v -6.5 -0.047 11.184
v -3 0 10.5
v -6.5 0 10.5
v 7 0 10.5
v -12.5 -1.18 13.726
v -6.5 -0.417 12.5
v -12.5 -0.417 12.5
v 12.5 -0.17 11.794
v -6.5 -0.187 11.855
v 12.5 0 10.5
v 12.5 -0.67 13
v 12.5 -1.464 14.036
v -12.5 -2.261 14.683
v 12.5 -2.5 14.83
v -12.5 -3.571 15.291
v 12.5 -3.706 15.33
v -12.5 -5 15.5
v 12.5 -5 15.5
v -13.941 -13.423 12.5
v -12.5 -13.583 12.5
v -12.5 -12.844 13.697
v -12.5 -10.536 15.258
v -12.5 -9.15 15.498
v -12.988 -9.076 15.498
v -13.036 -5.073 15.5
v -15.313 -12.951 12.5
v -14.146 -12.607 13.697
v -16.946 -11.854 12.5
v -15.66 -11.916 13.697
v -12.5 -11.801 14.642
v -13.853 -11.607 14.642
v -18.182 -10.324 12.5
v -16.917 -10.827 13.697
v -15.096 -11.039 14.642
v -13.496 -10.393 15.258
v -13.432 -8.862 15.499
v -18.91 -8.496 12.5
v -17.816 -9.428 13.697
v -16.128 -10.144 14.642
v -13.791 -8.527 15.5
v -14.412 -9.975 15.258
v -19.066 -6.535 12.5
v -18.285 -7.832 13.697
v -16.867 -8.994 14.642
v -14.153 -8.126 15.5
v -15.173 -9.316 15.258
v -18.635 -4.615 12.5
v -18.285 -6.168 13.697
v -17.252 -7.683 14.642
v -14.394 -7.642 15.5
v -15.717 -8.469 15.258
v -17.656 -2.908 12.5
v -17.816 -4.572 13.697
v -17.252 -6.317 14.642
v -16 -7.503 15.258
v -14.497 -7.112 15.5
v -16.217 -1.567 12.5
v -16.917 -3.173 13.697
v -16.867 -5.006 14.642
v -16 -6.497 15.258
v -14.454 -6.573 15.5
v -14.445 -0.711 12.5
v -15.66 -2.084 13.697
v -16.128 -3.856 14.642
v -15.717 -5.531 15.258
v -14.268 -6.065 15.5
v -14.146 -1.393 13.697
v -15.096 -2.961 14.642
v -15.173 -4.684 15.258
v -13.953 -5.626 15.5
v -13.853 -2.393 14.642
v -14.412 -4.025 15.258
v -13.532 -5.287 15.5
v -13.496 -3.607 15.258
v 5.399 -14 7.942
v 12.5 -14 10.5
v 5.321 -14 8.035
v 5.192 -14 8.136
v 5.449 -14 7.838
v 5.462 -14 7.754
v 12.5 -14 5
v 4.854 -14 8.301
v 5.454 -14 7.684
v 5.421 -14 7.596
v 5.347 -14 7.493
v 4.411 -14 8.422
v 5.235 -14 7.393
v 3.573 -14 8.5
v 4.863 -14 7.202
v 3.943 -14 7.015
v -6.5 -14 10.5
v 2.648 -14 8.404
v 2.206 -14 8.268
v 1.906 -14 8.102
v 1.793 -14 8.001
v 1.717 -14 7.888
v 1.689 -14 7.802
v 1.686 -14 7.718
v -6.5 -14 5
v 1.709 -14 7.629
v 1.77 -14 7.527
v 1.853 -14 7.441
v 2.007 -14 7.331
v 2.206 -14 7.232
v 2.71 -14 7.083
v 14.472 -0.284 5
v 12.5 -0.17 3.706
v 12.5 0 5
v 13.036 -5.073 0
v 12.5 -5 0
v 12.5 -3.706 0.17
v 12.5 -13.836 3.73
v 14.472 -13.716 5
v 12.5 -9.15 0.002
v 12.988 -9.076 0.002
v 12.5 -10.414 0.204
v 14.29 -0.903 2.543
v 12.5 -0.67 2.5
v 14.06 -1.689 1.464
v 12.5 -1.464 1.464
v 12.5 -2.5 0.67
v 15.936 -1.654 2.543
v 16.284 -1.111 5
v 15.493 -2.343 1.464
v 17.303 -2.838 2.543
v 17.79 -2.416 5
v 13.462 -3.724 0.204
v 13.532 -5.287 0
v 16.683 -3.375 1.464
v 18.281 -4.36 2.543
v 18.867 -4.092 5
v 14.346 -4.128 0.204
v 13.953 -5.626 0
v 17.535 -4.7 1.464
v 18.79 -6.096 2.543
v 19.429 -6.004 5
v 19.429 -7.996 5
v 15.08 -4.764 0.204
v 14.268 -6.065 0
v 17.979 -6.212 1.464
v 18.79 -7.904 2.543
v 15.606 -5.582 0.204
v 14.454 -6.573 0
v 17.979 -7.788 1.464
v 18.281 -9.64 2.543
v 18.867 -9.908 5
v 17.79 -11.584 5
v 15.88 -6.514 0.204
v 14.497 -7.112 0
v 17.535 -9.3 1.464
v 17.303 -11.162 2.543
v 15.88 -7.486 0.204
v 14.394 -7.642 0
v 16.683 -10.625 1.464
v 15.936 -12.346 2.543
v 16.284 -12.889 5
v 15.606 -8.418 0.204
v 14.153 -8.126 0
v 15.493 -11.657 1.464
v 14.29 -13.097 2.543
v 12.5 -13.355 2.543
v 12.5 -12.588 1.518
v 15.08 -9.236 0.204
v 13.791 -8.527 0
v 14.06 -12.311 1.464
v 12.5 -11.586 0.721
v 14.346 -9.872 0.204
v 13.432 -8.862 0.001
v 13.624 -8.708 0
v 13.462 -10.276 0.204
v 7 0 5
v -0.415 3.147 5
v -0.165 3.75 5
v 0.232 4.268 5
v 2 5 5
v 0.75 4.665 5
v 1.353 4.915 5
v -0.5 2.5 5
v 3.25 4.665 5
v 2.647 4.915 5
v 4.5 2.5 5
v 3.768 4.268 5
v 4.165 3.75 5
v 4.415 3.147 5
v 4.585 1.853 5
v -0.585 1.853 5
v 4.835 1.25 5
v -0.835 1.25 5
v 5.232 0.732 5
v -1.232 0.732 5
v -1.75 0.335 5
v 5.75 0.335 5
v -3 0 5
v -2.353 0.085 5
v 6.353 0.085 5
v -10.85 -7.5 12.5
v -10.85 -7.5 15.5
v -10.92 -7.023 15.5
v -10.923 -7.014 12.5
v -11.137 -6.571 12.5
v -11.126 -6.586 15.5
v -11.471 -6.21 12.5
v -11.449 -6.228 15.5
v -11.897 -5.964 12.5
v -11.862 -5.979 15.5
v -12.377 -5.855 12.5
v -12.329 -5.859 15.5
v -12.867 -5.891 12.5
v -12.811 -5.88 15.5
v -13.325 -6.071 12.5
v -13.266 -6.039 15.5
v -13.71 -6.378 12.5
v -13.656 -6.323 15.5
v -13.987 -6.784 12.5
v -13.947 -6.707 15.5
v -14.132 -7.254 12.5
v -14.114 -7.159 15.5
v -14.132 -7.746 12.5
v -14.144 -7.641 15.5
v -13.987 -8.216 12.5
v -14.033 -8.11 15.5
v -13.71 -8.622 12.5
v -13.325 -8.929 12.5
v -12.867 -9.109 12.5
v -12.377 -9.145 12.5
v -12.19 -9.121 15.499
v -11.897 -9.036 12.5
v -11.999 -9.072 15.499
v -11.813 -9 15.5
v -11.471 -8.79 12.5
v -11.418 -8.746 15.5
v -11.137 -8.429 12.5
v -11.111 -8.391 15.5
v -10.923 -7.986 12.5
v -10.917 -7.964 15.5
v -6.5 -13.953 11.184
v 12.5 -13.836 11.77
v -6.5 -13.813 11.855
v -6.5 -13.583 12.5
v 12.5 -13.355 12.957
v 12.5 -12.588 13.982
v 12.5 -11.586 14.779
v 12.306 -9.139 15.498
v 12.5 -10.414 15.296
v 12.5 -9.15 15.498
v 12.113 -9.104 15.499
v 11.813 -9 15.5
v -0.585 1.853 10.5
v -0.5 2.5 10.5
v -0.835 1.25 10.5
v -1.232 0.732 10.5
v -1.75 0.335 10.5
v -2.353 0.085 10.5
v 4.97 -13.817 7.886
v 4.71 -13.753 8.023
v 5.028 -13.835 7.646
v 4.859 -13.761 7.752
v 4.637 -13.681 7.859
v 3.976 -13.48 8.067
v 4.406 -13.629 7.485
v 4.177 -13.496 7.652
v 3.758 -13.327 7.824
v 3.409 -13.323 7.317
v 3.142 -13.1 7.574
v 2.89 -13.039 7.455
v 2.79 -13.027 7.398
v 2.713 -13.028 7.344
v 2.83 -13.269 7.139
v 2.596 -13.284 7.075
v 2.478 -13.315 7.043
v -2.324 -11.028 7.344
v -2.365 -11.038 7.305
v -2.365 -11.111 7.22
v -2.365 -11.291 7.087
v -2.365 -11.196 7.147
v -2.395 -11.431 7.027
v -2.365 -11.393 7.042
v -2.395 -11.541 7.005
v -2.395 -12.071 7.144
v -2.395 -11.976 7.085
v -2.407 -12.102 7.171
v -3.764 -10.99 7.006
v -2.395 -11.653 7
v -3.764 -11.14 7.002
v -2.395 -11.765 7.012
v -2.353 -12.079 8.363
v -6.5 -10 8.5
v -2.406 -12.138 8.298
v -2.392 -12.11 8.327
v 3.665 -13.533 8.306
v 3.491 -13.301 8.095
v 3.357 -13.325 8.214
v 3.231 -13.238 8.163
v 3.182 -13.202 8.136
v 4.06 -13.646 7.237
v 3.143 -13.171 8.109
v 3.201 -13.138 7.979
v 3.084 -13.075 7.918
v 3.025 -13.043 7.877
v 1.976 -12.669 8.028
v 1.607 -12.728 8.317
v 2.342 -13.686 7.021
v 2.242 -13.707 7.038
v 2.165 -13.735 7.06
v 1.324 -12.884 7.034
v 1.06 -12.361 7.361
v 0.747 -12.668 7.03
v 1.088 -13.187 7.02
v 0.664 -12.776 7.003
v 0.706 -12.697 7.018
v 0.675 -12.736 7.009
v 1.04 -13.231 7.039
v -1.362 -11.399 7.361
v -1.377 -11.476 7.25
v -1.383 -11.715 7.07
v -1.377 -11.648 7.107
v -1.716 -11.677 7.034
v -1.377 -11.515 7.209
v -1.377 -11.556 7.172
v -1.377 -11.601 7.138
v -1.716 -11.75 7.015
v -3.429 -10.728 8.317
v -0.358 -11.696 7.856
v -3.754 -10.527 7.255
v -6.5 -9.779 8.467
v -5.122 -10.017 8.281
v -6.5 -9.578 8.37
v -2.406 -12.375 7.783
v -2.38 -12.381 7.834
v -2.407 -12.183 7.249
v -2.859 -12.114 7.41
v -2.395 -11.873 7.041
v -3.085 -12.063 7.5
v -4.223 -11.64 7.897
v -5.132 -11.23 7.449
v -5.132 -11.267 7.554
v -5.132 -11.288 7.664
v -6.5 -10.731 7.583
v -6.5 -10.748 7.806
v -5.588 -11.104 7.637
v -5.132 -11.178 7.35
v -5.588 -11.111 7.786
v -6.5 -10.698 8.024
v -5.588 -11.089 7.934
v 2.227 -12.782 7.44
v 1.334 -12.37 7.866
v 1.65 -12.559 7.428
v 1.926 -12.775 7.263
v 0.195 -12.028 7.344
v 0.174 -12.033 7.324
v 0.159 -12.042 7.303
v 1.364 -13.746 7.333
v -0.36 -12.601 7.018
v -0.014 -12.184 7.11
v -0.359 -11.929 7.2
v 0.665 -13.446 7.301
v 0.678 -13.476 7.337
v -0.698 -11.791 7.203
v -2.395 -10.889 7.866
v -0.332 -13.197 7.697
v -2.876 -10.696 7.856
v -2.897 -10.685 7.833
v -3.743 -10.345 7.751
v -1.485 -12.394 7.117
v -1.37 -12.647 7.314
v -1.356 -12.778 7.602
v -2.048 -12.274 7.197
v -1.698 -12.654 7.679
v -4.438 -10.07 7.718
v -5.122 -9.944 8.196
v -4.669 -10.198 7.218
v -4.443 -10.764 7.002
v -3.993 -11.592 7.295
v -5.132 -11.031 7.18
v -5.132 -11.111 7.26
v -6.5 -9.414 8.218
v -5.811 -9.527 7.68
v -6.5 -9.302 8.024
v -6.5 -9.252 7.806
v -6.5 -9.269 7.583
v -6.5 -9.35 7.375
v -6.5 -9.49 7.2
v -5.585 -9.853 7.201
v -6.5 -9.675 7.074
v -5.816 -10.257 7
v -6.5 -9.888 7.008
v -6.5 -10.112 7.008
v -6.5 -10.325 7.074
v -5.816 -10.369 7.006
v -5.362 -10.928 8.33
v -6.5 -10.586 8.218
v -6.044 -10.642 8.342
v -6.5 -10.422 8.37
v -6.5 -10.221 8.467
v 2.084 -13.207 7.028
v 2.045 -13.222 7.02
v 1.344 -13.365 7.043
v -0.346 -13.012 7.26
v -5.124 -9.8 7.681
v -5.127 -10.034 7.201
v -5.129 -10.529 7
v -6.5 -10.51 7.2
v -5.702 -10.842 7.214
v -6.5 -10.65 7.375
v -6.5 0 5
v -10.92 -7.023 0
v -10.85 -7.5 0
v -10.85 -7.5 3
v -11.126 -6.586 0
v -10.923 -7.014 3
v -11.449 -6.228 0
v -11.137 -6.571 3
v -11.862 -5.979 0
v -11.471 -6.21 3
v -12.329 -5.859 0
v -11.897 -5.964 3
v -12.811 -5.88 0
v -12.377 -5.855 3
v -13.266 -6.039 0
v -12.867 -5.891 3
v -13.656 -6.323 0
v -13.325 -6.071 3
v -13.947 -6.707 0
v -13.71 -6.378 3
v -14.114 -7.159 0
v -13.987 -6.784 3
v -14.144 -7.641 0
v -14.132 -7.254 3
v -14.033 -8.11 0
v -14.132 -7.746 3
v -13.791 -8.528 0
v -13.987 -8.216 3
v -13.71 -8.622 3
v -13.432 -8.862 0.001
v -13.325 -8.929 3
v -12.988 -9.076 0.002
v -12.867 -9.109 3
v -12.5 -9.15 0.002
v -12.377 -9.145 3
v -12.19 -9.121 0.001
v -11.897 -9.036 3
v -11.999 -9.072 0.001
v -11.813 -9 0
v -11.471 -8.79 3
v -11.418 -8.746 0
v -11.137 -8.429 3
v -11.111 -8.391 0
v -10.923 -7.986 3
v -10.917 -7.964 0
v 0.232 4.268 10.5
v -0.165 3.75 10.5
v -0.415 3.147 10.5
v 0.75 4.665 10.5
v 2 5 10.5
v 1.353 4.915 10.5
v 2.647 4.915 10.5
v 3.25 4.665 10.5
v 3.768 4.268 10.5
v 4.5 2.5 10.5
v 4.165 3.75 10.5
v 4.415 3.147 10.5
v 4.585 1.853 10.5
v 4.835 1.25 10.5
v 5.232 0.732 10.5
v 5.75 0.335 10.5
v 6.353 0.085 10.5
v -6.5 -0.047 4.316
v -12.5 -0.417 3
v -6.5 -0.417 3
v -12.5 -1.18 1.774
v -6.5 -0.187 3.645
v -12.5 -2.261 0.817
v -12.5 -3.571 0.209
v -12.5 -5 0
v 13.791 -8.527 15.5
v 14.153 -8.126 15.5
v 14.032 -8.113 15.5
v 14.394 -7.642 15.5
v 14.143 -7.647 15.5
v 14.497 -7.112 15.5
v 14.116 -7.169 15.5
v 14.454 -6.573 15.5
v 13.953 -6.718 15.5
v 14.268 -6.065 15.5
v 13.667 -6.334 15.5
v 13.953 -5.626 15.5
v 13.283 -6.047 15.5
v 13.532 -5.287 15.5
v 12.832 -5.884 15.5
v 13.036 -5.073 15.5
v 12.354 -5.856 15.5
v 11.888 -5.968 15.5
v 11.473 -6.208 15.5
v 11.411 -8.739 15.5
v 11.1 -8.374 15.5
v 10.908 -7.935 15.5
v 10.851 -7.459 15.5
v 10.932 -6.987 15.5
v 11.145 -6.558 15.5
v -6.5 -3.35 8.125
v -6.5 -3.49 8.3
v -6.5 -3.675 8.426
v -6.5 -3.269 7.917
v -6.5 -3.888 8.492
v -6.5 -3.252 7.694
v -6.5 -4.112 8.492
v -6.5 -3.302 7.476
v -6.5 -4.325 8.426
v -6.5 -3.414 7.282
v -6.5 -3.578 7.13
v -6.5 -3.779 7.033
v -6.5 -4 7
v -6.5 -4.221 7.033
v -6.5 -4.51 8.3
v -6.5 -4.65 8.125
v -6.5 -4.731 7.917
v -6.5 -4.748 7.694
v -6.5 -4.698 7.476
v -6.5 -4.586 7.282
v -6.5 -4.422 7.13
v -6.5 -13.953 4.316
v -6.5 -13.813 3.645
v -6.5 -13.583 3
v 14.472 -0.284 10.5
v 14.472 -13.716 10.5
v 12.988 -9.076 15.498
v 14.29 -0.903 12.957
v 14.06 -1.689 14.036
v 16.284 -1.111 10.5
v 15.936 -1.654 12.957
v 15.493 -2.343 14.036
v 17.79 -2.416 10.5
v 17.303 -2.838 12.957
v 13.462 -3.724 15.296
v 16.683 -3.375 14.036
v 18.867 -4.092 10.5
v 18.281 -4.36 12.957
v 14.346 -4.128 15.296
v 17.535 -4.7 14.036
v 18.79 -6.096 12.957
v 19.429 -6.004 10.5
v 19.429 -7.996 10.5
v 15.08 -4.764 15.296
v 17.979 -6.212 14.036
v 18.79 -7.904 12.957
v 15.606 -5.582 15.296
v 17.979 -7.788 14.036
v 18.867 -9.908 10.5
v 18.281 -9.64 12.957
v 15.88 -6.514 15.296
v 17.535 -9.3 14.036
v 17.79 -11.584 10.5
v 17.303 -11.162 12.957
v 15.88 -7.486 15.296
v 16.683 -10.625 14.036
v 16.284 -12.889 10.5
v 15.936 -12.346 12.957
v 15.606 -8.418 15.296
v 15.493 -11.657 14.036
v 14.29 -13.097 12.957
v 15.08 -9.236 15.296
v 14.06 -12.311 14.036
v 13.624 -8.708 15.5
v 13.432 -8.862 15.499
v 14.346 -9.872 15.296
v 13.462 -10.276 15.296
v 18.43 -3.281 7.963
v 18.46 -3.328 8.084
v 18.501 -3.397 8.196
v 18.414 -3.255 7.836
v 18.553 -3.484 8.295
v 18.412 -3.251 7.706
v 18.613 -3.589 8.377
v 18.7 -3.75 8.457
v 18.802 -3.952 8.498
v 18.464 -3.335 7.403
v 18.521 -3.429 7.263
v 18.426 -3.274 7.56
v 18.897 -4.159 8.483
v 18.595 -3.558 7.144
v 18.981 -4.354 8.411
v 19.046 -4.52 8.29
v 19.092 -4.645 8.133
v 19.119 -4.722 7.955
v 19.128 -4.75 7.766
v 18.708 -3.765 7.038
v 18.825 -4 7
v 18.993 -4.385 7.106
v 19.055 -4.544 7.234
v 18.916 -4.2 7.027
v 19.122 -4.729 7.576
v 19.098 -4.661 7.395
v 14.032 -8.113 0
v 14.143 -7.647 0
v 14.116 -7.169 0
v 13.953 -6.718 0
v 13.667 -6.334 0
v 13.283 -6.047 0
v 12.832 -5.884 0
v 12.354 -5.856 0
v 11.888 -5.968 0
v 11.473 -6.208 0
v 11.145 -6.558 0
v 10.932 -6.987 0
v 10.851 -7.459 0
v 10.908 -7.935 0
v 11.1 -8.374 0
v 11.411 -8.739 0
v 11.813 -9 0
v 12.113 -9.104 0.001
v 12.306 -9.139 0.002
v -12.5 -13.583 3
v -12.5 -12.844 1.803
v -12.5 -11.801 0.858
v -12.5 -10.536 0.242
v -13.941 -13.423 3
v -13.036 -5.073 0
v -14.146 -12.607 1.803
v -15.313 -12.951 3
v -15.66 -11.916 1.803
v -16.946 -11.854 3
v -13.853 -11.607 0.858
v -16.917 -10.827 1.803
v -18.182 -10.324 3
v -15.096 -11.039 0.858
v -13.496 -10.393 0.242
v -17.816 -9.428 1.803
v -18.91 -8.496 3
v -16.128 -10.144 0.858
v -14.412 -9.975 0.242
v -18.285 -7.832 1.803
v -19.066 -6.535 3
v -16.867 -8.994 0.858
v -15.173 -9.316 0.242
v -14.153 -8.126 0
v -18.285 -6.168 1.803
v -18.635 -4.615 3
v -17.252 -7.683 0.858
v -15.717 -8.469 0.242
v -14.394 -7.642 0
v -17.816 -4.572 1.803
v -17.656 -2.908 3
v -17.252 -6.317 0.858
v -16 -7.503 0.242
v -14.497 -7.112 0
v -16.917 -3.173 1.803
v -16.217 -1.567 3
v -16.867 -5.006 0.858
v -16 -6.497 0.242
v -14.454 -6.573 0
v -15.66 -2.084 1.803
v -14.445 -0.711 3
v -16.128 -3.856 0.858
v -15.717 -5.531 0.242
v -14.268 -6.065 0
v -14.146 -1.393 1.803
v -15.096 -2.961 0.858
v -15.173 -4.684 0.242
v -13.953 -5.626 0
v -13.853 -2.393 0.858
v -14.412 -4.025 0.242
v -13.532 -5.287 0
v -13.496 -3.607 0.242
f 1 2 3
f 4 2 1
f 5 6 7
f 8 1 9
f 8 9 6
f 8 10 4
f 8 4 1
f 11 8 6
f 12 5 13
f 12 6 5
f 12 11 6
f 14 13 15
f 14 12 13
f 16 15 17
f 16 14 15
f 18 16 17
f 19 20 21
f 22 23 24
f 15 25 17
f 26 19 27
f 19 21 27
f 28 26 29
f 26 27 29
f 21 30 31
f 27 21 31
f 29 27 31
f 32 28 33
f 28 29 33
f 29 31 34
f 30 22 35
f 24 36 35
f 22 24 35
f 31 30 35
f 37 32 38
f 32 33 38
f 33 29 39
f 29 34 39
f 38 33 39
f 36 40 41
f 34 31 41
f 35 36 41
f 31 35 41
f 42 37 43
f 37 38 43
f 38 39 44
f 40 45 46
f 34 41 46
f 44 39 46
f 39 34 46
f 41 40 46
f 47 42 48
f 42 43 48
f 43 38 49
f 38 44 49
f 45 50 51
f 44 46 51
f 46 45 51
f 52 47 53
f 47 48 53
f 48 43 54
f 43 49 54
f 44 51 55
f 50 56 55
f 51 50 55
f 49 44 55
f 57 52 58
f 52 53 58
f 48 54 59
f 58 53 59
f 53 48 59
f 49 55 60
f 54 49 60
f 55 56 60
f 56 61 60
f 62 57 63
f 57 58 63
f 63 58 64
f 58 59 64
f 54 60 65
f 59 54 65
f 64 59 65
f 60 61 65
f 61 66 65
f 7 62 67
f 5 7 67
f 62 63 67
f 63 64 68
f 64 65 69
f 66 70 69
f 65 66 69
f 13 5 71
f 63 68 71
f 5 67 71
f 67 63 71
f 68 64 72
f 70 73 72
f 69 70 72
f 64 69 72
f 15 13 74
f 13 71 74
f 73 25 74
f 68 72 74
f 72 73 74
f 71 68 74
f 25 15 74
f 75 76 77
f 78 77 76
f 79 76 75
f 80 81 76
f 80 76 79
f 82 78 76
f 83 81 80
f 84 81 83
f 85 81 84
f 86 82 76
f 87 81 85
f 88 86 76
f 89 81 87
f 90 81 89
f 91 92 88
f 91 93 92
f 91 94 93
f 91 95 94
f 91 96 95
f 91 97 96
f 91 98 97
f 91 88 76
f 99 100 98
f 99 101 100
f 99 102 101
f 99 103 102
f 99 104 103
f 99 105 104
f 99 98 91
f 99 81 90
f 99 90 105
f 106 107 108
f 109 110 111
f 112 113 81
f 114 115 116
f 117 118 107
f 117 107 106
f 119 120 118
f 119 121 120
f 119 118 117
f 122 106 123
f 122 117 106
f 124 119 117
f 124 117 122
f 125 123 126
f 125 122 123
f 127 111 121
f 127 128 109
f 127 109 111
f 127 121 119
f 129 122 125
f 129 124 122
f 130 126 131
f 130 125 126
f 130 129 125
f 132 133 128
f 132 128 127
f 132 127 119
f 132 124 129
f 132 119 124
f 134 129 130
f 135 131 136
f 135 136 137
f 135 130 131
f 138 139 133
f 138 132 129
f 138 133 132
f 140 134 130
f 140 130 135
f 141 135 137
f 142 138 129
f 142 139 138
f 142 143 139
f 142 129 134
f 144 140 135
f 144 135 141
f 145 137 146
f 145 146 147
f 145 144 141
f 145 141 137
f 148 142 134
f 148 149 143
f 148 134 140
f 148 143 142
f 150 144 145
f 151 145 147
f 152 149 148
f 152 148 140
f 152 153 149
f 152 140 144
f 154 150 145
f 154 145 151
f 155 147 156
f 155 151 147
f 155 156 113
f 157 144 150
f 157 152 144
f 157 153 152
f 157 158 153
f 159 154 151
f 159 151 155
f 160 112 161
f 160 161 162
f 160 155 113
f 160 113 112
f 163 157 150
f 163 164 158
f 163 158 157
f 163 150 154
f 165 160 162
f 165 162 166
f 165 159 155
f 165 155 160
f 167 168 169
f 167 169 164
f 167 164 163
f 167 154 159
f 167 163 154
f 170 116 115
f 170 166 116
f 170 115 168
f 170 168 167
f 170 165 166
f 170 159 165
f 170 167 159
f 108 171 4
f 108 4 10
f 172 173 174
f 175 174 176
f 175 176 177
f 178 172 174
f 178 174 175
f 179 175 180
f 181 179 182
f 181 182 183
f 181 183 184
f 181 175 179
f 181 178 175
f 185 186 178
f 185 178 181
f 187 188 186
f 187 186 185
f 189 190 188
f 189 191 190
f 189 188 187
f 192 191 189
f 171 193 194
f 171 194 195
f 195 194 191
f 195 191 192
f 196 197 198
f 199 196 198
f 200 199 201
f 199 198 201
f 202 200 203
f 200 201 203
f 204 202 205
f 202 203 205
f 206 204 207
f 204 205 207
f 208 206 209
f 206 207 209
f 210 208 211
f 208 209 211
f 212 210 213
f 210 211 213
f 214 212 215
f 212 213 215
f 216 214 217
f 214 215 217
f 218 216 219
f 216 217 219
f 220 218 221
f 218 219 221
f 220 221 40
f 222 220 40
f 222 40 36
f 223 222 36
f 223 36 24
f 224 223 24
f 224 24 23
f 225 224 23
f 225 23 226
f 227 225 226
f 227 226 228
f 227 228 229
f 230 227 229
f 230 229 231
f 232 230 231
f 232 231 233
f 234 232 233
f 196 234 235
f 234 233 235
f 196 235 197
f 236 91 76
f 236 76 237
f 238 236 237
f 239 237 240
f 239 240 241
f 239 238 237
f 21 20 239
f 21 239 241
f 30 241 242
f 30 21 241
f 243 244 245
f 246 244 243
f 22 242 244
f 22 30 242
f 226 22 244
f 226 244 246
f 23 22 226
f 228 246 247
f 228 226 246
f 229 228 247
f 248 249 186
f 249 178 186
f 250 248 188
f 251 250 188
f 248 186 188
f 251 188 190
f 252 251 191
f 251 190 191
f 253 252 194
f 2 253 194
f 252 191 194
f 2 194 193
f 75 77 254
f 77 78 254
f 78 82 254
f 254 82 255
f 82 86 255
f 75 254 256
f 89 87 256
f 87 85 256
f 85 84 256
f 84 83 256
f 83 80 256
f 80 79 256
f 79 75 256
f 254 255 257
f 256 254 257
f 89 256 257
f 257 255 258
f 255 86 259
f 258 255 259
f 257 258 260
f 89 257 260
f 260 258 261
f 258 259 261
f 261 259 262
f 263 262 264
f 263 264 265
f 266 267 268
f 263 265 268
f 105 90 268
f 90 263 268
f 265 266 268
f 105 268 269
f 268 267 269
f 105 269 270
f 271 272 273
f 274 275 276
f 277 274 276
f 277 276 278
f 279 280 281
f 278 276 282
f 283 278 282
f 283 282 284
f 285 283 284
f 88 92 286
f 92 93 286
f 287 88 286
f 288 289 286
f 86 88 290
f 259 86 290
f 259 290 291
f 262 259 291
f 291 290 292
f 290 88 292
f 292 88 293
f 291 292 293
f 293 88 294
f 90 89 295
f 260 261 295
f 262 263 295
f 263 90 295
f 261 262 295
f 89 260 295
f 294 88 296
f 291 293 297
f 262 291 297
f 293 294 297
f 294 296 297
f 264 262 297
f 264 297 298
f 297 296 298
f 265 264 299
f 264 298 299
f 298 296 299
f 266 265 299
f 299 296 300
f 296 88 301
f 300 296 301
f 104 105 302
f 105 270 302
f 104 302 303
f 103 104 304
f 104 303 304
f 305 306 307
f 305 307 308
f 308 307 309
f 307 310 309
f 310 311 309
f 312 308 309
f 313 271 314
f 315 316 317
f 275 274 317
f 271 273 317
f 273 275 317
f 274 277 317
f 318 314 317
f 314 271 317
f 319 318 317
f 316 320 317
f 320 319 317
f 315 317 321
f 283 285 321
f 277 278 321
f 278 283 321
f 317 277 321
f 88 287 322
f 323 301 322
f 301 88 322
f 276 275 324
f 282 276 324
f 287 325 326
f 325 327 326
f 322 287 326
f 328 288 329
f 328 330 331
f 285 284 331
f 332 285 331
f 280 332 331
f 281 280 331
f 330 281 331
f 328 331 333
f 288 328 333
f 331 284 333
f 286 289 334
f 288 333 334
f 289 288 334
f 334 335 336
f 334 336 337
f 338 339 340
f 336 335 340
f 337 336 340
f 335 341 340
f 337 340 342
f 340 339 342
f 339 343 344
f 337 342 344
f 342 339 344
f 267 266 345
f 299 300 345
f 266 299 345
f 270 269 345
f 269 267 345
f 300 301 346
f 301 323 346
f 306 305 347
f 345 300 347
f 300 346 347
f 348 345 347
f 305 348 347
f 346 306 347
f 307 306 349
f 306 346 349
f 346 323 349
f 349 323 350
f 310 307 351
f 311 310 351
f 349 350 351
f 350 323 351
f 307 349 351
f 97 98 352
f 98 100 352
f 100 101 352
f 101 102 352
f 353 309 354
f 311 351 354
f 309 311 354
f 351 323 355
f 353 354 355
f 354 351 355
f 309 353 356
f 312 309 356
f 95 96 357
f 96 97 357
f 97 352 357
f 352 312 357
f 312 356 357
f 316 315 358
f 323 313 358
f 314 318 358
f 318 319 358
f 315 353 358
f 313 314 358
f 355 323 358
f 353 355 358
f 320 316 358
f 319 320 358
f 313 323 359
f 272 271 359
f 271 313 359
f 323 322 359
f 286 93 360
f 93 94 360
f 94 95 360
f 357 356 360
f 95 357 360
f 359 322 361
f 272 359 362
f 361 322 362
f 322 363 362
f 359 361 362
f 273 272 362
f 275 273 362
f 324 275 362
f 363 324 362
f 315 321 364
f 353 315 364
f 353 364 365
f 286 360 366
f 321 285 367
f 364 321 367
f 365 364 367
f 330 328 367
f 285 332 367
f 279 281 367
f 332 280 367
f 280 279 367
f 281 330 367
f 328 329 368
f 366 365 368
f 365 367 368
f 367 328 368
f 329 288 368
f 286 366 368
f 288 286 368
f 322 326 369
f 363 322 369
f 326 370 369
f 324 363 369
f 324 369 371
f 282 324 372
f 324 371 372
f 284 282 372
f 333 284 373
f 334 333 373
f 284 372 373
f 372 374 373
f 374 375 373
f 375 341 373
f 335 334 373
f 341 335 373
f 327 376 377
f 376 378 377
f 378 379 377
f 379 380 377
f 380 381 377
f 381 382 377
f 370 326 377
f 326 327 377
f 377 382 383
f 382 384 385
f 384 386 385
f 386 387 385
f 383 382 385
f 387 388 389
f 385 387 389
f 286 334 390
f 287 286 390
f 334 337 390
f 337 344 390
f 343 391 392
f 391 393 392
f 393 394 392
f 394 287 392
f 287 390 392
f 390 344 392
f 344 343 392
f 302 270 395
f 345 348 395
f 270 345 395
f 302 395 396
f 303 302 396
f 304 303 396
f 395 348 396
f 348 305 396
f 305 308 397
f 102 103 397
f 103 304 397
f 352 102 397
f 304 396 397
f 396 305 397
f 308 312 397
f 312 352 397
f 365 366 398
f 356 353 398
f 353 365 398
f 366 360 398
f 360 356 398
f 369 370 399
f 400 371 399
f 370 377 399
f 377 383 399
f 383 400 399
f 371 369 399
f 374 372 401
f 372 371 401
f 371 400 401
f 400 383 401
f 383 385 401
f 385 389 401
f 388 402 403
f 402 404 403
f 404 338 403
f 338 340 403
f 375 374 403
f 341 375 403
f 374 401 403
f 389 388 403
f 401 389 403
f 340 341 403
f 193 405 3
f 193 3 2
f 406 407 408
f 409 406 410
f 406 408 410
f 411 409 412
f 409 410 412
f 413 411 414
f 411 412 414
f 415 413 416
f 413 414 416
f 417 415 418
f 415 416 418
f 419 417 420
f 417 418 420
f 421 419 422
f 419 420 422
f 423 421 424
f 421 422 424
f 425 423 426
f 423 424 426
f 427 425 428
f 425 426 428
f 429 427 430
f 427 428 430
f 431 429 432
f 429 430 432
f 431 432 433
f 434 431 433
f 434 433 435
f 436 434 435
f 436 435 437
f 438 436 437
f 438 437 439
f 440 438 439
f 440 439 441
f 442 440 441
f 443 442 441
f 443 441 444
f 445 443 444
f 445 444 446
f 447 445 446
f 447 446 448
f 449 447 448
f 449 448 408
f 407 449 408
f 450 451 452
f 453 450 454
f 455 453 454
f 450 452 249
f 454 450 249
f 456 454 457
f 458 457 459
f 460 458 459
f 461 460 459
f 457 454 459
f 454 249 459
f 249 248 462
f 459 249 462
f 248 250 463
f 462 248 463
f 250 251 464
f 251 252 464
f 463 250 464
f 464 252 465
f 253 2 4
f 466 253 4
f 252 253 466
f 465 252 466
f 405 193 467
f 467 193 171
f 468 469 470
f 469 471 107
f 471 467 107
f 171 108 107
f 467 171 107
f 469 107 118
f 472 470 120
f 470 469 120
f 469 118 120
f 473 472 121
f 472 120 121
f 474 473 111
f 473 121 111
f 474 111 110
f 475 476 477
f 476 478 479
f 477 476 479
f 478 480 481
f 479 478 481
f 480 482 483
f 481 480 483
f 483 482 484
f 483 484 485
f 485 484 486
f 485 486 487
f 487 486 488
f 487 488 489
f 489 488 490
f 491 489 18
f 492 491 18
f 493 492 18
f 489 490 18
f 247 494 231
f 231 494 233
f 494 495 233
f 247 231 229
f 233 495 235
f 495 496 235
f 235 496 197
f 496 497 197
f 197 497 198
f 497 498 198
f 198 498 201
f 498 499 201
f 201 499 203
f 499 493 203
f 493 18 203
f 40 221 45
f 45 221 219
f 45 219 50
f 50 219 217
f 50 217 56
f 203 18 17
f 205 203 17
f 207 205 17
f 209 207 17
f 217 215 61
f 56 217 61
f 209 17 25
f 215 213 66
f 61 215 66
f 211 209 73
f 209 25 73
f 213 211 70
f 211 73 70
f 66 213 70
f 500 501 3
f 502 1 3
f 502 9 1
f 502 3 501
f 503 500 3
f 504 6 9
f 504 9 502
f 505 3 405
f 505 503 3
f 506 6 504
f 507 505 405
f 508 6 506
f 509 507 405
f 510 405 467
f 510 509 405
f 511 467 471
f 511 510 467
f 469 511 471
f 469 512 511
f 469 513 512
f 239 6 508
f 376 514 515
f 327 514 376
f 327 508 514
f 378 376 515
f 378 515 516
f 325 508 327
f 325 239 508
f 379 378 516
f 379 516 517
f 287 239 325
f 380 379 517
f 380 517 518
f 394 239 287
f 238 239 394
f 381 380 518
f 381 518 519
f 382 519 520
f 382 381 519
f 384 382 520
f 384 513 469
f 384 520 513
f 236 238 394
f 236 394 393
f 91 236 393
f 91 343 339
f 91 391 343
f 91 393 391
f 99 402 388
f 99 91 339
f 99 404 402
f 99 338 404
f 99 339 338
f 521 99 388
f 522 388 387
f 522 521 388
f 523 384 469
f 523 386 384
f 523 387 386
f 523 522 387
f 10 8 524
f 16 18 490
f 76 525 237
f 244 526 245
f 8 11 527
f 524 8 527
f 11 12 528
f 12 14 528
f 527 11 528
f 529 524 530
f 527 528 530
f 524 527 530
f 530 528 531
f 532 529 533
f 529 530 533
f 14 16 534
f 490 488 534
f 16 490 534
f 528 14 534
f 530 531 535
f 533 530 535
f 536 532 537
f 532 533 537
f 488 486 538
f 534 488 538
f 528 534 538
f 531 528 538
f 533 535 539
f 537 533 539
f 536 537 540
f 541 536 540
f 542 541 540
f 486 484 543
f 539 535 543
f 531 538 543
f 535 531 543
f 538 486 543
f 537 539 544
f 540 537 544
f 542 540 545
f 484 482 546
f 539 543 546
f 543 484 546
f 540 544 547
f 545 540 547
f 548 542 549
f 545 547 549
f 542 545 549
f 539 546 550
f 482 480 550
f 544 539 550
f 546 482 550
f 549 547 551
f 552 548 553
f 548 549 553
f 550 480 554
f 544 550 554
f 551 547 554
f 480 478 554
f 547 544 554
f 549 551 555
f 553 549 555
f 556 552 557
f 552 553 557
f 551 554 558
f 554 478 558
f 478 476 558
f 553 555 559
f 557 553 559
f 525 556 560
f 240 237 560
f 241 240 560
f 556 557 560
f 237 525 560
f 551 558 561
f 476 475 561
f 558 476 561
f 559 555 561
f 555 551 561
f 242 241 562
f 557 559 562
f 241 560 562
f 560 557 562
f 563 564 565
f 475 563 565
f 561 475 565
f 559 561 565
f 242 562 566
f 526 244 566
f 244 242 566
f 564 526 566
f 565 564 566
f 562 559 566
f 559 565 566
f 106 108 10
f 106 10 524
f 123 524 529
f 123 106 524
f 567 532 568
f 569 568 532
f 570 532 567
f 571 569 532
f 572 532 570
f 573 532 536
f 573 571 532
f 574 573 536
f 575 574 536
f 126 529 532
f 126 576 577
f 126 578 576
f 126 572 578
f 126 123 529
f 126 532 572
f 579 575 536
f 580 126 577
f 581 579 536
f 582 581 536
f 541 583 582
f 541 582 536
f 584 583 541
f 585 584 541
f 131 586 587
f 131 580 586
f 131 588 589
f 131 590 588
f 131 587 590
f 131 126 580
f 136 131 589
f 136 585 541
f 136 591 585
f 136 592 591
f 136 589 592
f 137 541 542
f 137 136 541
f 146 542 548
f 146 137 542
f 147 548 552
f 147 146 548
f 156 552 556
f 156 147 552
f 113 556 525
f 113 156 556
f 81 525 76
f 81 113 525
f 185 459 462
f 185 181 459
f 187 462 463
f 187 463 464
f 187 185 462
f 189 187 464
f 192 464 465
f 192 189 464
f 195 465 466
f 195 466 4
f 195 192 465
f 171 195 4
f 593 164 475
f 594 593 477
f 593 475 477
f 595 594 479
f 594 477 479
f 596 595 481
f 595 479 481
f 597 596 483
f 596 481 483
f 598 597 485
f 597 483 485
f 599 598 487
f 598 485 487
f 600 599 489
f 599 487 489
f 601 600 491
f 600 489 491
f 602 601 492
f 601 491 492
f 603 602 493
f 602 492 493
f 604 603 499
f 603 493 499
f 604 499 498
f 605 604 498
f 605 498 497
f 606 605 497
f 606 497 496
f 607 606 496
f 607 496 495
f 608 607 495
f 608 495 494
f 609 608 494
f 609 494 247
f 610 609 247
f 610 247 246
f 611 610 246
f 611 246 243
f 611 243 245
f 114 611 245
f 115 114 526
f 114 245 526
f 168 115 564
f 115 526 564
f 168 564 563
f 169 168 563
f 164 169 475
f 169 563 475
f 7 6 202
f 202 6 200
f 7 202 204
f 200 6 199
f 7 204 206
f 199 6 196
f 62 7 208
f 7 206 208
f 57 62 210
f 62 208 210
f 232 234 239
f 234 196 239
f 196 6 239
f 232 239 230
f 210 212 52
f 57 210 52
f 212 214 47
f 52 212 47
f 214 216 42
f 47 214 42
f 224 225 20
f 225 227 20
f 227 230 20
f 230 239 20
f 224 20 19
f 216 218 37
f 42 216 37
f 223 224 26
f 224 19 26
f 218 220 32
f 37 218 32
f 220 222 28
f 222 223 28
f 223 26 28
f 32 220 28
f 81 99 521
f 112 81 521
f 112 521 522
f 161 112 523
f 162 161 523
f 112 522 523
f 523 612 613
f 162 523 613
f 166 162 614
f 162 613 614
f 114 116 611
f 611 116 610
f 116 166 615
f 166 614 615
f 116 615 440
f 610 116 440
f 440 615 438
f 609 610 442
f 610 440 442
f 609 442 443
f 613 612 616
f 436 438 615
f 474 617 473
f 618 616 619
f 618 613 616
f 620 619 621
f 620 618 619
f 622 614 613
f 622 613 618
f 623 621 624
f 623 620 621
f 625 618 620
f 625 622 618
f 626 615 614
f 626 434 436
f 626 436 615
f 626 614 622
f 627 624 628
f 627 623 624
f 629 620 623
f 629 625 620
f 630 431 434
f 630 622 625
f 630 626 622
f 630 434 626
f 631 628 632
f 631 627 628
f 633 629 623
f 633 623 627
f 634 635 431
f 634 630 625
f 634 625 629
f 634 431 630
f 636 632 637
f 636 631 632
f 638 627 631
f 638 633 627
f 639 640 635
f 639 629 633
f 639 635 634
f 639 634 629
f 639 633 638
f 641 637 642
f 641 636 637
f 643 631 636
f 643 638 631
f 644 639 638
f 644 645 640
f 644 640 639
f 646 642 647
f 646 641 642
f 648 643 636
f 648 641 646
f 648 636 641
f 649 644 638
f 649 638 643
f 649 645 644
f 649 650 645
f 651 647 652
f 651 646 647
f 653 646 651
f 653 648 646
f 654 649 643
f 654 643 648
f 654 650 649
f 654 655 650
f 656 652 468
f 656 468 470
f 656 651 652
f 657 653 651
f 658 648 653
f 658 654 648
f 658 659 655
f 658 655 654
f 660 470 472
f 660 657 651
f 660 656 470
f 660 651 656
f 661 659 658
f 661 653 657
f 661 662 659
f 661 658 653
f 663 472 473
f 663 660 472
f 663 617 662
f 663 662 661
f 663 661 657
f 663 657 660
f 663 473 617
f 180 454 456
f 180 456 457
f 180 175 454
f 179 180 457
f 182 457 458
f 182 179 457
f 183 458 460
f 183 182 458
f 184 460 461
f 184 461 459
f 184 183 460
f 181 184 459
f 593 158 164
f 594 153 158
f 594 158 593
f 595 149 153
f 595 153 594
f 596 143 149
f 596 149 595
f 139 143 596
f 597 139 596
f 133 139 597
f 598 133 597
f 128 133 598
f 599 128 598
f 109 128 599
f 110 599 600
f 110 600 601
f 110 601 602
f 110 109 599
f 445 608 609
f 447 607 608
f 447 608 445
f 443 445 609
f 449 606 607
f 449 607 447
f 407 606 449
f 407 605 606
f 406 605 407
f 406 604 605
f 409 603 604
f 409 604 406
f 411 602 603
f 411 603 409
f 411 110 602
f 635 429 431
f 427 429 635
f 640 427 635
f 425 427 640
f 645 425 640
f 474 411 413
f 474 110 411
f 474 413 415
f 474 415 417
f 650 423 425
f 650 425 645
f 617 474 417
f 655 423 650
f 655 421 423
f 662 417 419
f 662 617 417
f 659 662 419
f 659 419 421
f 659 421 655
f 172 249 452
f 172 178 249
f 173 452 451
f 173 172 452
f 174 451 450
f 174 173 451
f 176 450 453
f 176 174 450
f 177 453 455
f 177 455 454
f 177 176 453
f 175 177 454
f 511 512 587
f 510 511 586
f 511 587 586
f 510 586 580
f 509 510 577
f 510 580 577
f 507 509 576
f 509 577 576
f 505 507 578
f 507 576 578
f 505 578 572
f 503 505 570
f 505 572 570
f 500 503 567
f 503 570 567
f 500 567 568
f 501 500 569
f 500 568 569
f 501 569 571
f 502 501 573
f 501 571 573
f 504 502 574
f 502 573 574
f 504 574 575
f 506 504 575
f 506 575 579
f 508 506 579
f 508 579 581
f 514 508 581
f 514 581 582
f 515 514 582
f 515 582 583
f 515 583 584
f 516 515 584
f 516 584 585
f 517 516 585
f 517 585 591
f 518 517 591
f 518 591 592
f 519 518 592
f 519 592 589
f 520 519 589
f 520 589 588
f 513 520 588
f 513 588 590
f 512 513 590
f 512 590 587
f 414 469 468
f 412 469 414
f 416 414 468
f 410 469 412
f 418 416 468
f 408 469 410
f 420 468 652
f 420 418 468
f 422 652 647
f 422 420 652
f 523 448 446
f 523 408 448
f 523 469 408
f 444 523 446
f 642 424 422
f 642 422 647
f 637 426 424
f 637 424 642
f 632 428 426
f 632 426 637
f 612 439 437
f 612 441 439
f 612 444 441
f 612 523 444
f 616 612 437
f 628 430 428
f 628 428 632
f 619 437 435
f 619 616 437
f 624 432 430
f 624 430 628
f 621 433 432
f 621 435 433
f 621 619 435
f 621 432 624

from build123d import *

# Parameters (mm, degrees)
BOSS_EXTRUDE1_DEPTH = 15.5
FILLET1_R           = 5
SKETCH5_W           = 13
SKETCH5_H           = 9.5
CUT_EXTRUDE3_DEPTH  = 36.29164207
SKETCH6_W           = 5
SKETCH6_H           = 5.5
BOSS_EXTRUDE2_DEPTH = 5
FILLET2_R           = 2.5
FILLET3_R           = 2.5
SKETCH3_R           = 1.65
CUT_EXTRUDE4_DEPTH  = 29.574464179
SKETCH8_R           = 0.75
CUT_EXTRUDE7_DEPTH  = 44.873285276
SKETCH9_R           = 0.75
CUT_EXTRUDE9_DEPTH  = 17.215351852


with BuildPart() as part:
    # Sketch2 → Boss-Extrude1 (new body)
    with BuildSketch(Plane.XY):
        with BuildLine():
            Line((-12.5, 0), (12.5, 0))
            ThreePointArc((12.5, 0), (19.5, -7), (12.5, -14))
            Line((12.5, -14), (-12.5, -14))
            ThreePointArc((-12.5, -14), (-19.5, -7), (-12.5, 0))
        make_face()
    extrude(amount=BOSS_EXTRUDE1_DEPTH)

    # Fillet1
    fillet1_edges = [part.edges().sort_by_distance(p)[0] for p in [
        (-19.5, -7, 15.5),
        (0, -14, 15.5),
        (19.5, -7, 15.5),
        (0, -14, 0),
        (-19.5, -7, 0),
        (0, 0, 0),
        (19.5, -7, 0),
        (0, 0, 15.5),
    ]]
    fillet(fillet1_edges, radius=FILLET1_R)

    # Sketch5 → Cut-Extrude3 (cut, through all)
    with BuildSketch(Plane(origin=(0, -25, 0), x_dir=(-1, 0, 0), z_dir=(0, -1, 0))):
        with Locations((13, -7.75)):
            Rectangle(SKETCH5_W, SKETCH5_H)
    extrude(amount=-CUT_EXTRUDE3_DEPTH, mode=Mode.SUBTRACT)

    # Sketch6 → Boss-Extrude2 (add)
    with BuildSketch(Plane(origin=(0, 0, 0), x_dir=(1, 0, 0), z_dir=(0, 1, 0))):
        with Locations((2, -7.75)):
            Rectangle(SKETCH6_W, SKETCH6_H)
    extrude(amount=BOSS_EXTRUDE2_DEPTH)

    # Fillet2
    fillet2_edges = [part.edges().sort_by_distance(p)[0] for p in [
        (4.5, 5, 7.75),
        (-0.5, 5, 7.75),
    ]]
    fillet(fillet2_edges, radius=FILLET2_R - 0.0001)  # a hair under: the kernel refuses the full size

    # Fillet3
    fillet3_edges = [part.edges().sort_by_distance(p)[0] for p in [
        (-0.5, 0, 7.75),
        (4.5, 0, 7.75),
    ]]
    fillet(fillet3_edges, radius=FILLET3_R)

    # Sketch3 → Cut-Extrude4 (cut, through all)
    with BuildSketch(Plane.XY.offset(15.5)):
        with Locations((-12.5, -7.5)):
            Circle(SKETCH3_R)
        with Locations(Location((12.5, -7.5, 0), (0, 0, 321.484430951))):
            Circle(SKETCH3_R)
    extrude(amount=-CUT_EXTRUDE4_DEPTH, mode=Mode.SUBTRACT)

    # Sketch8 → Cut-Extrude7 (cut, through all)
    with BuildSketch(Plane(origin=(19.5, 0, 0), x_dir=(0, 0, -1), z_dir=(1, 0, 0))):
        with Locations((-7.75, -4)):
            Circle(SKETCH8_R)
    extrude(amount=-CUT_EXTRUDE7_DEPTH, mode=Mode.SUBTRACT)

    # Sketch9 → Cut-Extrude9 (cut, along a direction that is not the sketch's normal)
    with BuildSketch(Plane.ZY.offset(6.5)):
        with Locations((7.75, -10)):
            Circle(SKETCH9_R)
    extrude(amount=-CUT_EXTRUDE9_DEPTH, dir=(-0.9294030199155335, 0.36906642569039866, 0), mode=Mode.SUBTRACT)


solid = part.part
